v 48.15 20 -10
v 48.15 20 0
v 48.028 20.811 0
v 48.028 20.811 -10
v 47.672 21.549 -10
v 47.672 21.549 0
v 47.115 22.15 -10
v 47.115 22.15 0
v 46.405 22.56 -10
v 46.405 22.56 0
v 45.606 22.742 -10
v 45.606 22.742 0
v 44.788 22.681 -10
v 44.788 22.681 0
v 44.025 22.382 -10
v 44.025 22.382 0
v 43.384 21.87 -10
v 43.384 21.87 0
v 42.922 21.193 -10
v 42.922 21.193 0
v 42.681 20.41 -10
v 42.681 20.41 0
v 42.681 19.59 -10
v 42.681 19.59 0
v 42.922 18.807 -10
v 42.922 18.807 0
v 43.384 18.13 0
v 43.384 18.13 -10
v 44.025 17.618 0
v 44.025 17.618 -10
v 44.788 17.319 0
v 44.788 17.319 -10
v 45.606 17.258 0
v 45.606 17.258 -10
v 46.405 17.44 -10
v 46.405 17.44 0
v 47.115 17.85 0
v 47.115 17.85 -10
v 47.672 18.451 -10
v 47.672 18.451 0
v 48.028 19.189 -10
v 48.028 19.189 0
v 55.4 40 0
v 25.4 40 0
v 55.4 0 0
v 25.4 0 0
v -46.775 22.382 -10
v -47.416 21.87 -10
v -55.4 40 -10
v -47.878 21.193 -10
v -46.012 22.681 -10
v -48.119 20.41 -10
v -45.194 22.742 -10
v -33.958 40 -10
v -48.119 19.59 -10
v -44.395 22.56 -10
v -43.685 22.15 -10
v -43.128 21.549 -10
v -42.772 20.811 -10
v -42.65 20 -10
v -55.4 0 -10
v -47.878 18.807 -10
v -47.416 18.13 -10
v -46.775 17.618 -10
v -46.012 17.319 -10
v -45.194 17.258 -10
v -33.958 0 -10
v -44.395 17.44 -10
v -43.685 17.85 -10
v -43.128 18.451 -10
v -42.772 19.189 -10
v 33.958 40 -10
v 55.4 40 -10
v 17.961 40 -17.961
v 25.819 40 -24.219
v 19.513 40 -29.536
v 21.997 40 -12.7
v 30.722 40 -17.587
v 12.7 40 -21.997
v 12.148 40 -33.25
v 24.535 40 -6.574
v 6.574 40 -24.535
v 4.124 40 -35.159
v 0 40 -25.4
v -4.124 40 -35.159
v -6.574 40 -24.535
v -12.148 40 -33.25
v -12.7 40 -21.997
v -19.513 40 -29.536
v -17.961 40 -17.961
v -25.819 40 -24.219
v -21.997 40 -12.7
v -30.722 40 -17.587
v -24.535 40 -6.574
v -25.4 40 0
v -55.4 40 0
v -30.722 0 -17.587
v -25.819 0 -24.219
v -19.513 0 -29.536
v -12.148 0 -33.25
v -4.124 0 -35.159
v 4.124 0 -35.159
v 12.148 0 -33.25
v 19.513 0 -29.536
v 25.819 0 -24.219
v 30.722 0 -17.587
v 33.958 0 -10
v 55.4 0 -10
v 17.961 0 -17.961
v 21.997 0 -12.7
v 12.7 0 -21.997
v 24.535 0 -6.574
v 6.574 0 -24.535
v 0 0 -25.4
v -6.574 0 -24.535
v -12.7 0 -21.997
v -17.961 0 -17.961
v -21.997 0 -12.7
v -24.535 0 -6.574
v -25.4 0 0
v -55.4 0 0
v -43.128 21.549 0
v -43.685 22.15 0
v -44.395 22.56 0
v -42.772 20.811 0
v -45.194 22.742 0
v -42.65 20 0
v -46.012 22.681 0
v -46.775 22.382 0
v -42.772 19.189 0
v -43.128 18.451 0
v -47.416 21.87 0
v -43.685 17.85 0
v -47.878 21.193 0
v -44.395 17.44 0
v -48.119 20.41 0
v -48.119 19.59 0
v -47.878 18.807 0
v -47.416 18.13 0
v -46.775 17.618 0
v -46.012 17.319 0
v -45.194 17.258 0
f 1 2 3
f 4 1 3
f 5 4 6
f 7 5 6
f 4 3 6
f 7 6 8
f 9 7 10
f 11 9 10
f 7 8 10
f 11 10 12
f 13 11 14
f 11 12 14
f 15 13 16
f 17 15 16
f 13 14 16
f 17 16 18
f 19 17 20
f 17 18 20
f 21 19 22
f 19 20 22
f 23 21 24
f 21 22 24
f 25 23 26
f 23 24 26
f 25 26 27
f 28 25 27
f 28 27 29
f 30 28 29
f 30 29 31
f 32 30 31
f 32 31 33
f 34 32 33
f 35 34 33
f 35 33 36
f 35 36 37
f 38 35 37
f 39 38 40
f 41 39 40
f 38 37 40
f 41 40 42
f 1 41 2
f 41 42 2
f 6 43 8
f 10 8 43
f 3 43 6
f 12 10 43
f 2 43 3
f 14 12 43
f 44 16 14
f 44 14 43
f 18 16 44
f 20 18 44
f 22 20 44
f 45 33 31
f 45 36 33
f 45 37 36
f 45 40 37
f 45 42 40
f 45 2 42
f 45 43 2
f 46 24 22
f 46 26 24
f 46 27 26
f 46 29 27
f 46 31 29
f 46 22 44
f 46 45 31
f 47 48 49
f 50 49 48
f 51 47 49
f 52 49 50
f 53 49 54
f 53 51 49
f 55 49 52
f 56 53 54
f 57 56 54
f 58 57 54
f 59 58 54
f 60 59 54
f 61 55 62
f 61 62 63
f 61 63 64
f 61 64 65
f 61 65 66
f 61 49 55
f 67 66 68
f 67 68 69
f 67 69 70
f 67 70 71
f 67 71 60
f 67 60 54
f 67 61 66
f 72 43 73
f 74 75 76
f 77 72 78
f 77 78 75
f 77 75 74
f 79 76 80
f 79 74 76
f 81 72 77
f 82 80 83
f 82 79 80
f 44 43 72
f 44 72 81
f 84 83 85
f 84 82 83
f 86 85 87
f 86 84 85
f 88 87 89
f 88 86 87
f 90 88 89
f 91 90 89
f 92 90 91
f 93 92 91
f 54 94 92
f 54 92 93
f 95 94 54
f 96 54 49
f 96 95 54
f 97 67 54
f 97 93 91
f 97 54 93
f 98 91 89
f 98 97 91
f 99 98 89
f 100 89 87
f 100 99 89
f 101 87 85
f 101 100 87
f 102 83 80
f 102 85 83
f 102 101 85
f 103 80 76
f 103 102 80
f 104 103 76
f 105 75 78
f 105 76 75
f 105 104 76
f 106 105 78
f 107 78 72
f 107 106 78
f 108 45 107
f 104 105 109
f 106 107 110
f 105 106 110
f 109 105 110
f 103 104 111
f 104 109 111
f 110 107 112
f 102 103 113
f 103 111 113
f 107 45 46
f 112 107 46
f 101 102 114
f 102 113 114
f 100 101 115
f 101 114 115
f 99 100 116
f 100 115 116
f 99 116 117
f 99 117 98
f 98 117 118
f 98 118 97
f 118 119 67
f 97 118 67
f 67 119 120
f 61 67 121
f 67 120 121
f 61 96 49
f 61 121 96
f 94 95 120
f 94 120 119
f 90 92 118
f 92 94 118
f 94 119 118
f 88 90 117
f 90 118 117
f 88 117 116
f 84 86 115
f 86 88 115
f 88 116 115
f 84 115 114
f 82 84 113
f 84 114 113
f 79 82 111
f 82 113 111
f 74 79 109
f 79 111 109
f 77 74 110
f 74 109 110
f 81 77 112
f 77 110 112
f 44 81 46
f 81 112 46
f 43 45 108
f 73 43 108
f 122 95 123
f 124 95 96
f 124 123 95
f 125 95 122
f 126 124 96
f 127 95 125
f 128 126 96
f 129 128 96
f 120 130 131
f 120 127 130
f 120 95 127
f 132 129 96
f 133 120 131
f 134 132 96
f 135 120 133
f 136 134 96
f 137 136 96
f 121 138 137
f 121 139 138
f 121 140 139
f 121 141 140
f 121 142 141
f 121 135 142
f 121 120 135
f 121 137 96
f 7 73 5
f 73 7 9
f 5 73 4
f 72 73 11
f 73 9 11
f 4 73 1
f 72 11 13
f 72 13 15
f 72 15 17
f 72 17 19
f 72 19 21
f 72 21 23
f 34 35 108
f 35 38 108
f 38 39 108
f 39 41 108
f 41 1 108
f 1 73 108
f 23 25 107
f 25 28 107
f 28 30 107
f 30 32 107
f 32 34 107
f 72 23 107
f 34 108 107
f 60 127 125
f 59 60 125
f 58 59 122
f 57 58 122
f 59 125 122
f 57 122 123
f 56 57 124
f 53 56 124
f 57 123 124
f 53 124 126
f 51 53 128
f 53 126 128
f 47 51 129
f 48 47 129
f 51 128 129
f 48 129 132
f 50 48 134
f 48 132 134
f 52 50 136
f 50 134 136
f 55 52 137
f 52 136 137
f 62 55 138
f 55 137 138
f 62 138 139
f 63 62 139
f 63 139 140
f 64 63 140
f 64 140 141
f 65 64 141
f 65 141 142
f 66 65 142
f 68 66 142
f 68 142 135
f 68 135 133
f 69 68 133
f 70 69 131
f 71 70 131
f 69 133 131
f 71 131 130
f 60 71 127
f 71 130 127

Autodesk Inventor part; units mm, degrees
ref_plane "YZ Plane" through (0, 0, 0) normal (1, 0, 0) x (0, 1, 0)
ref_plane "XZ Plane" through (0, 0, 0) normal (0, 1, 0) x (-1, 0, 0)
ref_plane "XY Plane" through (0, 0, 0) normal (0, 0, 1) x (1, 0, 0)
sketch "Sketch1" plane through (0, 0, 0) normal (0, 1, 0) x (-1, 0, 0)
  arc A0 (-25.4, 0) -> (25.4, 0) centre (0, 0) ccw
  arc A1 (-35.4, 0) -> (35.4, 0) centre (0, 0) ccw
  line L0 (-35.4, 0) -> (-25.4, 0)
  line L1 (25.4, 0) -> (35.4, 0)
  line L2 (35.4, 0) -> (55.4, 0)
  line L3 (55.4, 0) -> (55.4, -10)
  line L4 (55.4, -10) -> (33.9582, -10)
  line L5 (-35.4, 0) -> (-55.4, 0)
  line L6 (-55.4, 0) -> (-55.4, -10)
  line L7 (-55.4, -10) -> (-33.9582, -10)
  dimension "d0" = 50.8
  dimension "d1" = 10
  dimension "d2" = 20
  dimension "d3" = 10
  dimension "d4" = 20
  dimension "d5" = 10
extrude "Extrusion1" add sketch "Sketch1" along normal blind 40
sketch "Sketch2" plane through (-55.4, 0, 0) normal (0, 0, 1) x (1, 0, 0)
  circle A0 centre (10, 20) radius 2.75
  circle A1 centre (100.8, 20) radius 2.75
  line L0 (80.8, 40) -> (110.8, 40) projected
  line L1 (110.8, 0) -> (110.8, 40) projected
  line L2 (0, 0) -> (0, 40) projected
  line L3 (0, 40) -> (30, 40) projected
  point P0 (55.4, 0)
  dimension "d8" = 5.5
  dimension "d9" = 5.5
  dimension "d10" = 20
  dimension "d11" = 10
  dimension "d12" = 10
  dimension "d13" = 20
extrude "Extrusion2" cut sketch "Sketch2" against normal blind 40
